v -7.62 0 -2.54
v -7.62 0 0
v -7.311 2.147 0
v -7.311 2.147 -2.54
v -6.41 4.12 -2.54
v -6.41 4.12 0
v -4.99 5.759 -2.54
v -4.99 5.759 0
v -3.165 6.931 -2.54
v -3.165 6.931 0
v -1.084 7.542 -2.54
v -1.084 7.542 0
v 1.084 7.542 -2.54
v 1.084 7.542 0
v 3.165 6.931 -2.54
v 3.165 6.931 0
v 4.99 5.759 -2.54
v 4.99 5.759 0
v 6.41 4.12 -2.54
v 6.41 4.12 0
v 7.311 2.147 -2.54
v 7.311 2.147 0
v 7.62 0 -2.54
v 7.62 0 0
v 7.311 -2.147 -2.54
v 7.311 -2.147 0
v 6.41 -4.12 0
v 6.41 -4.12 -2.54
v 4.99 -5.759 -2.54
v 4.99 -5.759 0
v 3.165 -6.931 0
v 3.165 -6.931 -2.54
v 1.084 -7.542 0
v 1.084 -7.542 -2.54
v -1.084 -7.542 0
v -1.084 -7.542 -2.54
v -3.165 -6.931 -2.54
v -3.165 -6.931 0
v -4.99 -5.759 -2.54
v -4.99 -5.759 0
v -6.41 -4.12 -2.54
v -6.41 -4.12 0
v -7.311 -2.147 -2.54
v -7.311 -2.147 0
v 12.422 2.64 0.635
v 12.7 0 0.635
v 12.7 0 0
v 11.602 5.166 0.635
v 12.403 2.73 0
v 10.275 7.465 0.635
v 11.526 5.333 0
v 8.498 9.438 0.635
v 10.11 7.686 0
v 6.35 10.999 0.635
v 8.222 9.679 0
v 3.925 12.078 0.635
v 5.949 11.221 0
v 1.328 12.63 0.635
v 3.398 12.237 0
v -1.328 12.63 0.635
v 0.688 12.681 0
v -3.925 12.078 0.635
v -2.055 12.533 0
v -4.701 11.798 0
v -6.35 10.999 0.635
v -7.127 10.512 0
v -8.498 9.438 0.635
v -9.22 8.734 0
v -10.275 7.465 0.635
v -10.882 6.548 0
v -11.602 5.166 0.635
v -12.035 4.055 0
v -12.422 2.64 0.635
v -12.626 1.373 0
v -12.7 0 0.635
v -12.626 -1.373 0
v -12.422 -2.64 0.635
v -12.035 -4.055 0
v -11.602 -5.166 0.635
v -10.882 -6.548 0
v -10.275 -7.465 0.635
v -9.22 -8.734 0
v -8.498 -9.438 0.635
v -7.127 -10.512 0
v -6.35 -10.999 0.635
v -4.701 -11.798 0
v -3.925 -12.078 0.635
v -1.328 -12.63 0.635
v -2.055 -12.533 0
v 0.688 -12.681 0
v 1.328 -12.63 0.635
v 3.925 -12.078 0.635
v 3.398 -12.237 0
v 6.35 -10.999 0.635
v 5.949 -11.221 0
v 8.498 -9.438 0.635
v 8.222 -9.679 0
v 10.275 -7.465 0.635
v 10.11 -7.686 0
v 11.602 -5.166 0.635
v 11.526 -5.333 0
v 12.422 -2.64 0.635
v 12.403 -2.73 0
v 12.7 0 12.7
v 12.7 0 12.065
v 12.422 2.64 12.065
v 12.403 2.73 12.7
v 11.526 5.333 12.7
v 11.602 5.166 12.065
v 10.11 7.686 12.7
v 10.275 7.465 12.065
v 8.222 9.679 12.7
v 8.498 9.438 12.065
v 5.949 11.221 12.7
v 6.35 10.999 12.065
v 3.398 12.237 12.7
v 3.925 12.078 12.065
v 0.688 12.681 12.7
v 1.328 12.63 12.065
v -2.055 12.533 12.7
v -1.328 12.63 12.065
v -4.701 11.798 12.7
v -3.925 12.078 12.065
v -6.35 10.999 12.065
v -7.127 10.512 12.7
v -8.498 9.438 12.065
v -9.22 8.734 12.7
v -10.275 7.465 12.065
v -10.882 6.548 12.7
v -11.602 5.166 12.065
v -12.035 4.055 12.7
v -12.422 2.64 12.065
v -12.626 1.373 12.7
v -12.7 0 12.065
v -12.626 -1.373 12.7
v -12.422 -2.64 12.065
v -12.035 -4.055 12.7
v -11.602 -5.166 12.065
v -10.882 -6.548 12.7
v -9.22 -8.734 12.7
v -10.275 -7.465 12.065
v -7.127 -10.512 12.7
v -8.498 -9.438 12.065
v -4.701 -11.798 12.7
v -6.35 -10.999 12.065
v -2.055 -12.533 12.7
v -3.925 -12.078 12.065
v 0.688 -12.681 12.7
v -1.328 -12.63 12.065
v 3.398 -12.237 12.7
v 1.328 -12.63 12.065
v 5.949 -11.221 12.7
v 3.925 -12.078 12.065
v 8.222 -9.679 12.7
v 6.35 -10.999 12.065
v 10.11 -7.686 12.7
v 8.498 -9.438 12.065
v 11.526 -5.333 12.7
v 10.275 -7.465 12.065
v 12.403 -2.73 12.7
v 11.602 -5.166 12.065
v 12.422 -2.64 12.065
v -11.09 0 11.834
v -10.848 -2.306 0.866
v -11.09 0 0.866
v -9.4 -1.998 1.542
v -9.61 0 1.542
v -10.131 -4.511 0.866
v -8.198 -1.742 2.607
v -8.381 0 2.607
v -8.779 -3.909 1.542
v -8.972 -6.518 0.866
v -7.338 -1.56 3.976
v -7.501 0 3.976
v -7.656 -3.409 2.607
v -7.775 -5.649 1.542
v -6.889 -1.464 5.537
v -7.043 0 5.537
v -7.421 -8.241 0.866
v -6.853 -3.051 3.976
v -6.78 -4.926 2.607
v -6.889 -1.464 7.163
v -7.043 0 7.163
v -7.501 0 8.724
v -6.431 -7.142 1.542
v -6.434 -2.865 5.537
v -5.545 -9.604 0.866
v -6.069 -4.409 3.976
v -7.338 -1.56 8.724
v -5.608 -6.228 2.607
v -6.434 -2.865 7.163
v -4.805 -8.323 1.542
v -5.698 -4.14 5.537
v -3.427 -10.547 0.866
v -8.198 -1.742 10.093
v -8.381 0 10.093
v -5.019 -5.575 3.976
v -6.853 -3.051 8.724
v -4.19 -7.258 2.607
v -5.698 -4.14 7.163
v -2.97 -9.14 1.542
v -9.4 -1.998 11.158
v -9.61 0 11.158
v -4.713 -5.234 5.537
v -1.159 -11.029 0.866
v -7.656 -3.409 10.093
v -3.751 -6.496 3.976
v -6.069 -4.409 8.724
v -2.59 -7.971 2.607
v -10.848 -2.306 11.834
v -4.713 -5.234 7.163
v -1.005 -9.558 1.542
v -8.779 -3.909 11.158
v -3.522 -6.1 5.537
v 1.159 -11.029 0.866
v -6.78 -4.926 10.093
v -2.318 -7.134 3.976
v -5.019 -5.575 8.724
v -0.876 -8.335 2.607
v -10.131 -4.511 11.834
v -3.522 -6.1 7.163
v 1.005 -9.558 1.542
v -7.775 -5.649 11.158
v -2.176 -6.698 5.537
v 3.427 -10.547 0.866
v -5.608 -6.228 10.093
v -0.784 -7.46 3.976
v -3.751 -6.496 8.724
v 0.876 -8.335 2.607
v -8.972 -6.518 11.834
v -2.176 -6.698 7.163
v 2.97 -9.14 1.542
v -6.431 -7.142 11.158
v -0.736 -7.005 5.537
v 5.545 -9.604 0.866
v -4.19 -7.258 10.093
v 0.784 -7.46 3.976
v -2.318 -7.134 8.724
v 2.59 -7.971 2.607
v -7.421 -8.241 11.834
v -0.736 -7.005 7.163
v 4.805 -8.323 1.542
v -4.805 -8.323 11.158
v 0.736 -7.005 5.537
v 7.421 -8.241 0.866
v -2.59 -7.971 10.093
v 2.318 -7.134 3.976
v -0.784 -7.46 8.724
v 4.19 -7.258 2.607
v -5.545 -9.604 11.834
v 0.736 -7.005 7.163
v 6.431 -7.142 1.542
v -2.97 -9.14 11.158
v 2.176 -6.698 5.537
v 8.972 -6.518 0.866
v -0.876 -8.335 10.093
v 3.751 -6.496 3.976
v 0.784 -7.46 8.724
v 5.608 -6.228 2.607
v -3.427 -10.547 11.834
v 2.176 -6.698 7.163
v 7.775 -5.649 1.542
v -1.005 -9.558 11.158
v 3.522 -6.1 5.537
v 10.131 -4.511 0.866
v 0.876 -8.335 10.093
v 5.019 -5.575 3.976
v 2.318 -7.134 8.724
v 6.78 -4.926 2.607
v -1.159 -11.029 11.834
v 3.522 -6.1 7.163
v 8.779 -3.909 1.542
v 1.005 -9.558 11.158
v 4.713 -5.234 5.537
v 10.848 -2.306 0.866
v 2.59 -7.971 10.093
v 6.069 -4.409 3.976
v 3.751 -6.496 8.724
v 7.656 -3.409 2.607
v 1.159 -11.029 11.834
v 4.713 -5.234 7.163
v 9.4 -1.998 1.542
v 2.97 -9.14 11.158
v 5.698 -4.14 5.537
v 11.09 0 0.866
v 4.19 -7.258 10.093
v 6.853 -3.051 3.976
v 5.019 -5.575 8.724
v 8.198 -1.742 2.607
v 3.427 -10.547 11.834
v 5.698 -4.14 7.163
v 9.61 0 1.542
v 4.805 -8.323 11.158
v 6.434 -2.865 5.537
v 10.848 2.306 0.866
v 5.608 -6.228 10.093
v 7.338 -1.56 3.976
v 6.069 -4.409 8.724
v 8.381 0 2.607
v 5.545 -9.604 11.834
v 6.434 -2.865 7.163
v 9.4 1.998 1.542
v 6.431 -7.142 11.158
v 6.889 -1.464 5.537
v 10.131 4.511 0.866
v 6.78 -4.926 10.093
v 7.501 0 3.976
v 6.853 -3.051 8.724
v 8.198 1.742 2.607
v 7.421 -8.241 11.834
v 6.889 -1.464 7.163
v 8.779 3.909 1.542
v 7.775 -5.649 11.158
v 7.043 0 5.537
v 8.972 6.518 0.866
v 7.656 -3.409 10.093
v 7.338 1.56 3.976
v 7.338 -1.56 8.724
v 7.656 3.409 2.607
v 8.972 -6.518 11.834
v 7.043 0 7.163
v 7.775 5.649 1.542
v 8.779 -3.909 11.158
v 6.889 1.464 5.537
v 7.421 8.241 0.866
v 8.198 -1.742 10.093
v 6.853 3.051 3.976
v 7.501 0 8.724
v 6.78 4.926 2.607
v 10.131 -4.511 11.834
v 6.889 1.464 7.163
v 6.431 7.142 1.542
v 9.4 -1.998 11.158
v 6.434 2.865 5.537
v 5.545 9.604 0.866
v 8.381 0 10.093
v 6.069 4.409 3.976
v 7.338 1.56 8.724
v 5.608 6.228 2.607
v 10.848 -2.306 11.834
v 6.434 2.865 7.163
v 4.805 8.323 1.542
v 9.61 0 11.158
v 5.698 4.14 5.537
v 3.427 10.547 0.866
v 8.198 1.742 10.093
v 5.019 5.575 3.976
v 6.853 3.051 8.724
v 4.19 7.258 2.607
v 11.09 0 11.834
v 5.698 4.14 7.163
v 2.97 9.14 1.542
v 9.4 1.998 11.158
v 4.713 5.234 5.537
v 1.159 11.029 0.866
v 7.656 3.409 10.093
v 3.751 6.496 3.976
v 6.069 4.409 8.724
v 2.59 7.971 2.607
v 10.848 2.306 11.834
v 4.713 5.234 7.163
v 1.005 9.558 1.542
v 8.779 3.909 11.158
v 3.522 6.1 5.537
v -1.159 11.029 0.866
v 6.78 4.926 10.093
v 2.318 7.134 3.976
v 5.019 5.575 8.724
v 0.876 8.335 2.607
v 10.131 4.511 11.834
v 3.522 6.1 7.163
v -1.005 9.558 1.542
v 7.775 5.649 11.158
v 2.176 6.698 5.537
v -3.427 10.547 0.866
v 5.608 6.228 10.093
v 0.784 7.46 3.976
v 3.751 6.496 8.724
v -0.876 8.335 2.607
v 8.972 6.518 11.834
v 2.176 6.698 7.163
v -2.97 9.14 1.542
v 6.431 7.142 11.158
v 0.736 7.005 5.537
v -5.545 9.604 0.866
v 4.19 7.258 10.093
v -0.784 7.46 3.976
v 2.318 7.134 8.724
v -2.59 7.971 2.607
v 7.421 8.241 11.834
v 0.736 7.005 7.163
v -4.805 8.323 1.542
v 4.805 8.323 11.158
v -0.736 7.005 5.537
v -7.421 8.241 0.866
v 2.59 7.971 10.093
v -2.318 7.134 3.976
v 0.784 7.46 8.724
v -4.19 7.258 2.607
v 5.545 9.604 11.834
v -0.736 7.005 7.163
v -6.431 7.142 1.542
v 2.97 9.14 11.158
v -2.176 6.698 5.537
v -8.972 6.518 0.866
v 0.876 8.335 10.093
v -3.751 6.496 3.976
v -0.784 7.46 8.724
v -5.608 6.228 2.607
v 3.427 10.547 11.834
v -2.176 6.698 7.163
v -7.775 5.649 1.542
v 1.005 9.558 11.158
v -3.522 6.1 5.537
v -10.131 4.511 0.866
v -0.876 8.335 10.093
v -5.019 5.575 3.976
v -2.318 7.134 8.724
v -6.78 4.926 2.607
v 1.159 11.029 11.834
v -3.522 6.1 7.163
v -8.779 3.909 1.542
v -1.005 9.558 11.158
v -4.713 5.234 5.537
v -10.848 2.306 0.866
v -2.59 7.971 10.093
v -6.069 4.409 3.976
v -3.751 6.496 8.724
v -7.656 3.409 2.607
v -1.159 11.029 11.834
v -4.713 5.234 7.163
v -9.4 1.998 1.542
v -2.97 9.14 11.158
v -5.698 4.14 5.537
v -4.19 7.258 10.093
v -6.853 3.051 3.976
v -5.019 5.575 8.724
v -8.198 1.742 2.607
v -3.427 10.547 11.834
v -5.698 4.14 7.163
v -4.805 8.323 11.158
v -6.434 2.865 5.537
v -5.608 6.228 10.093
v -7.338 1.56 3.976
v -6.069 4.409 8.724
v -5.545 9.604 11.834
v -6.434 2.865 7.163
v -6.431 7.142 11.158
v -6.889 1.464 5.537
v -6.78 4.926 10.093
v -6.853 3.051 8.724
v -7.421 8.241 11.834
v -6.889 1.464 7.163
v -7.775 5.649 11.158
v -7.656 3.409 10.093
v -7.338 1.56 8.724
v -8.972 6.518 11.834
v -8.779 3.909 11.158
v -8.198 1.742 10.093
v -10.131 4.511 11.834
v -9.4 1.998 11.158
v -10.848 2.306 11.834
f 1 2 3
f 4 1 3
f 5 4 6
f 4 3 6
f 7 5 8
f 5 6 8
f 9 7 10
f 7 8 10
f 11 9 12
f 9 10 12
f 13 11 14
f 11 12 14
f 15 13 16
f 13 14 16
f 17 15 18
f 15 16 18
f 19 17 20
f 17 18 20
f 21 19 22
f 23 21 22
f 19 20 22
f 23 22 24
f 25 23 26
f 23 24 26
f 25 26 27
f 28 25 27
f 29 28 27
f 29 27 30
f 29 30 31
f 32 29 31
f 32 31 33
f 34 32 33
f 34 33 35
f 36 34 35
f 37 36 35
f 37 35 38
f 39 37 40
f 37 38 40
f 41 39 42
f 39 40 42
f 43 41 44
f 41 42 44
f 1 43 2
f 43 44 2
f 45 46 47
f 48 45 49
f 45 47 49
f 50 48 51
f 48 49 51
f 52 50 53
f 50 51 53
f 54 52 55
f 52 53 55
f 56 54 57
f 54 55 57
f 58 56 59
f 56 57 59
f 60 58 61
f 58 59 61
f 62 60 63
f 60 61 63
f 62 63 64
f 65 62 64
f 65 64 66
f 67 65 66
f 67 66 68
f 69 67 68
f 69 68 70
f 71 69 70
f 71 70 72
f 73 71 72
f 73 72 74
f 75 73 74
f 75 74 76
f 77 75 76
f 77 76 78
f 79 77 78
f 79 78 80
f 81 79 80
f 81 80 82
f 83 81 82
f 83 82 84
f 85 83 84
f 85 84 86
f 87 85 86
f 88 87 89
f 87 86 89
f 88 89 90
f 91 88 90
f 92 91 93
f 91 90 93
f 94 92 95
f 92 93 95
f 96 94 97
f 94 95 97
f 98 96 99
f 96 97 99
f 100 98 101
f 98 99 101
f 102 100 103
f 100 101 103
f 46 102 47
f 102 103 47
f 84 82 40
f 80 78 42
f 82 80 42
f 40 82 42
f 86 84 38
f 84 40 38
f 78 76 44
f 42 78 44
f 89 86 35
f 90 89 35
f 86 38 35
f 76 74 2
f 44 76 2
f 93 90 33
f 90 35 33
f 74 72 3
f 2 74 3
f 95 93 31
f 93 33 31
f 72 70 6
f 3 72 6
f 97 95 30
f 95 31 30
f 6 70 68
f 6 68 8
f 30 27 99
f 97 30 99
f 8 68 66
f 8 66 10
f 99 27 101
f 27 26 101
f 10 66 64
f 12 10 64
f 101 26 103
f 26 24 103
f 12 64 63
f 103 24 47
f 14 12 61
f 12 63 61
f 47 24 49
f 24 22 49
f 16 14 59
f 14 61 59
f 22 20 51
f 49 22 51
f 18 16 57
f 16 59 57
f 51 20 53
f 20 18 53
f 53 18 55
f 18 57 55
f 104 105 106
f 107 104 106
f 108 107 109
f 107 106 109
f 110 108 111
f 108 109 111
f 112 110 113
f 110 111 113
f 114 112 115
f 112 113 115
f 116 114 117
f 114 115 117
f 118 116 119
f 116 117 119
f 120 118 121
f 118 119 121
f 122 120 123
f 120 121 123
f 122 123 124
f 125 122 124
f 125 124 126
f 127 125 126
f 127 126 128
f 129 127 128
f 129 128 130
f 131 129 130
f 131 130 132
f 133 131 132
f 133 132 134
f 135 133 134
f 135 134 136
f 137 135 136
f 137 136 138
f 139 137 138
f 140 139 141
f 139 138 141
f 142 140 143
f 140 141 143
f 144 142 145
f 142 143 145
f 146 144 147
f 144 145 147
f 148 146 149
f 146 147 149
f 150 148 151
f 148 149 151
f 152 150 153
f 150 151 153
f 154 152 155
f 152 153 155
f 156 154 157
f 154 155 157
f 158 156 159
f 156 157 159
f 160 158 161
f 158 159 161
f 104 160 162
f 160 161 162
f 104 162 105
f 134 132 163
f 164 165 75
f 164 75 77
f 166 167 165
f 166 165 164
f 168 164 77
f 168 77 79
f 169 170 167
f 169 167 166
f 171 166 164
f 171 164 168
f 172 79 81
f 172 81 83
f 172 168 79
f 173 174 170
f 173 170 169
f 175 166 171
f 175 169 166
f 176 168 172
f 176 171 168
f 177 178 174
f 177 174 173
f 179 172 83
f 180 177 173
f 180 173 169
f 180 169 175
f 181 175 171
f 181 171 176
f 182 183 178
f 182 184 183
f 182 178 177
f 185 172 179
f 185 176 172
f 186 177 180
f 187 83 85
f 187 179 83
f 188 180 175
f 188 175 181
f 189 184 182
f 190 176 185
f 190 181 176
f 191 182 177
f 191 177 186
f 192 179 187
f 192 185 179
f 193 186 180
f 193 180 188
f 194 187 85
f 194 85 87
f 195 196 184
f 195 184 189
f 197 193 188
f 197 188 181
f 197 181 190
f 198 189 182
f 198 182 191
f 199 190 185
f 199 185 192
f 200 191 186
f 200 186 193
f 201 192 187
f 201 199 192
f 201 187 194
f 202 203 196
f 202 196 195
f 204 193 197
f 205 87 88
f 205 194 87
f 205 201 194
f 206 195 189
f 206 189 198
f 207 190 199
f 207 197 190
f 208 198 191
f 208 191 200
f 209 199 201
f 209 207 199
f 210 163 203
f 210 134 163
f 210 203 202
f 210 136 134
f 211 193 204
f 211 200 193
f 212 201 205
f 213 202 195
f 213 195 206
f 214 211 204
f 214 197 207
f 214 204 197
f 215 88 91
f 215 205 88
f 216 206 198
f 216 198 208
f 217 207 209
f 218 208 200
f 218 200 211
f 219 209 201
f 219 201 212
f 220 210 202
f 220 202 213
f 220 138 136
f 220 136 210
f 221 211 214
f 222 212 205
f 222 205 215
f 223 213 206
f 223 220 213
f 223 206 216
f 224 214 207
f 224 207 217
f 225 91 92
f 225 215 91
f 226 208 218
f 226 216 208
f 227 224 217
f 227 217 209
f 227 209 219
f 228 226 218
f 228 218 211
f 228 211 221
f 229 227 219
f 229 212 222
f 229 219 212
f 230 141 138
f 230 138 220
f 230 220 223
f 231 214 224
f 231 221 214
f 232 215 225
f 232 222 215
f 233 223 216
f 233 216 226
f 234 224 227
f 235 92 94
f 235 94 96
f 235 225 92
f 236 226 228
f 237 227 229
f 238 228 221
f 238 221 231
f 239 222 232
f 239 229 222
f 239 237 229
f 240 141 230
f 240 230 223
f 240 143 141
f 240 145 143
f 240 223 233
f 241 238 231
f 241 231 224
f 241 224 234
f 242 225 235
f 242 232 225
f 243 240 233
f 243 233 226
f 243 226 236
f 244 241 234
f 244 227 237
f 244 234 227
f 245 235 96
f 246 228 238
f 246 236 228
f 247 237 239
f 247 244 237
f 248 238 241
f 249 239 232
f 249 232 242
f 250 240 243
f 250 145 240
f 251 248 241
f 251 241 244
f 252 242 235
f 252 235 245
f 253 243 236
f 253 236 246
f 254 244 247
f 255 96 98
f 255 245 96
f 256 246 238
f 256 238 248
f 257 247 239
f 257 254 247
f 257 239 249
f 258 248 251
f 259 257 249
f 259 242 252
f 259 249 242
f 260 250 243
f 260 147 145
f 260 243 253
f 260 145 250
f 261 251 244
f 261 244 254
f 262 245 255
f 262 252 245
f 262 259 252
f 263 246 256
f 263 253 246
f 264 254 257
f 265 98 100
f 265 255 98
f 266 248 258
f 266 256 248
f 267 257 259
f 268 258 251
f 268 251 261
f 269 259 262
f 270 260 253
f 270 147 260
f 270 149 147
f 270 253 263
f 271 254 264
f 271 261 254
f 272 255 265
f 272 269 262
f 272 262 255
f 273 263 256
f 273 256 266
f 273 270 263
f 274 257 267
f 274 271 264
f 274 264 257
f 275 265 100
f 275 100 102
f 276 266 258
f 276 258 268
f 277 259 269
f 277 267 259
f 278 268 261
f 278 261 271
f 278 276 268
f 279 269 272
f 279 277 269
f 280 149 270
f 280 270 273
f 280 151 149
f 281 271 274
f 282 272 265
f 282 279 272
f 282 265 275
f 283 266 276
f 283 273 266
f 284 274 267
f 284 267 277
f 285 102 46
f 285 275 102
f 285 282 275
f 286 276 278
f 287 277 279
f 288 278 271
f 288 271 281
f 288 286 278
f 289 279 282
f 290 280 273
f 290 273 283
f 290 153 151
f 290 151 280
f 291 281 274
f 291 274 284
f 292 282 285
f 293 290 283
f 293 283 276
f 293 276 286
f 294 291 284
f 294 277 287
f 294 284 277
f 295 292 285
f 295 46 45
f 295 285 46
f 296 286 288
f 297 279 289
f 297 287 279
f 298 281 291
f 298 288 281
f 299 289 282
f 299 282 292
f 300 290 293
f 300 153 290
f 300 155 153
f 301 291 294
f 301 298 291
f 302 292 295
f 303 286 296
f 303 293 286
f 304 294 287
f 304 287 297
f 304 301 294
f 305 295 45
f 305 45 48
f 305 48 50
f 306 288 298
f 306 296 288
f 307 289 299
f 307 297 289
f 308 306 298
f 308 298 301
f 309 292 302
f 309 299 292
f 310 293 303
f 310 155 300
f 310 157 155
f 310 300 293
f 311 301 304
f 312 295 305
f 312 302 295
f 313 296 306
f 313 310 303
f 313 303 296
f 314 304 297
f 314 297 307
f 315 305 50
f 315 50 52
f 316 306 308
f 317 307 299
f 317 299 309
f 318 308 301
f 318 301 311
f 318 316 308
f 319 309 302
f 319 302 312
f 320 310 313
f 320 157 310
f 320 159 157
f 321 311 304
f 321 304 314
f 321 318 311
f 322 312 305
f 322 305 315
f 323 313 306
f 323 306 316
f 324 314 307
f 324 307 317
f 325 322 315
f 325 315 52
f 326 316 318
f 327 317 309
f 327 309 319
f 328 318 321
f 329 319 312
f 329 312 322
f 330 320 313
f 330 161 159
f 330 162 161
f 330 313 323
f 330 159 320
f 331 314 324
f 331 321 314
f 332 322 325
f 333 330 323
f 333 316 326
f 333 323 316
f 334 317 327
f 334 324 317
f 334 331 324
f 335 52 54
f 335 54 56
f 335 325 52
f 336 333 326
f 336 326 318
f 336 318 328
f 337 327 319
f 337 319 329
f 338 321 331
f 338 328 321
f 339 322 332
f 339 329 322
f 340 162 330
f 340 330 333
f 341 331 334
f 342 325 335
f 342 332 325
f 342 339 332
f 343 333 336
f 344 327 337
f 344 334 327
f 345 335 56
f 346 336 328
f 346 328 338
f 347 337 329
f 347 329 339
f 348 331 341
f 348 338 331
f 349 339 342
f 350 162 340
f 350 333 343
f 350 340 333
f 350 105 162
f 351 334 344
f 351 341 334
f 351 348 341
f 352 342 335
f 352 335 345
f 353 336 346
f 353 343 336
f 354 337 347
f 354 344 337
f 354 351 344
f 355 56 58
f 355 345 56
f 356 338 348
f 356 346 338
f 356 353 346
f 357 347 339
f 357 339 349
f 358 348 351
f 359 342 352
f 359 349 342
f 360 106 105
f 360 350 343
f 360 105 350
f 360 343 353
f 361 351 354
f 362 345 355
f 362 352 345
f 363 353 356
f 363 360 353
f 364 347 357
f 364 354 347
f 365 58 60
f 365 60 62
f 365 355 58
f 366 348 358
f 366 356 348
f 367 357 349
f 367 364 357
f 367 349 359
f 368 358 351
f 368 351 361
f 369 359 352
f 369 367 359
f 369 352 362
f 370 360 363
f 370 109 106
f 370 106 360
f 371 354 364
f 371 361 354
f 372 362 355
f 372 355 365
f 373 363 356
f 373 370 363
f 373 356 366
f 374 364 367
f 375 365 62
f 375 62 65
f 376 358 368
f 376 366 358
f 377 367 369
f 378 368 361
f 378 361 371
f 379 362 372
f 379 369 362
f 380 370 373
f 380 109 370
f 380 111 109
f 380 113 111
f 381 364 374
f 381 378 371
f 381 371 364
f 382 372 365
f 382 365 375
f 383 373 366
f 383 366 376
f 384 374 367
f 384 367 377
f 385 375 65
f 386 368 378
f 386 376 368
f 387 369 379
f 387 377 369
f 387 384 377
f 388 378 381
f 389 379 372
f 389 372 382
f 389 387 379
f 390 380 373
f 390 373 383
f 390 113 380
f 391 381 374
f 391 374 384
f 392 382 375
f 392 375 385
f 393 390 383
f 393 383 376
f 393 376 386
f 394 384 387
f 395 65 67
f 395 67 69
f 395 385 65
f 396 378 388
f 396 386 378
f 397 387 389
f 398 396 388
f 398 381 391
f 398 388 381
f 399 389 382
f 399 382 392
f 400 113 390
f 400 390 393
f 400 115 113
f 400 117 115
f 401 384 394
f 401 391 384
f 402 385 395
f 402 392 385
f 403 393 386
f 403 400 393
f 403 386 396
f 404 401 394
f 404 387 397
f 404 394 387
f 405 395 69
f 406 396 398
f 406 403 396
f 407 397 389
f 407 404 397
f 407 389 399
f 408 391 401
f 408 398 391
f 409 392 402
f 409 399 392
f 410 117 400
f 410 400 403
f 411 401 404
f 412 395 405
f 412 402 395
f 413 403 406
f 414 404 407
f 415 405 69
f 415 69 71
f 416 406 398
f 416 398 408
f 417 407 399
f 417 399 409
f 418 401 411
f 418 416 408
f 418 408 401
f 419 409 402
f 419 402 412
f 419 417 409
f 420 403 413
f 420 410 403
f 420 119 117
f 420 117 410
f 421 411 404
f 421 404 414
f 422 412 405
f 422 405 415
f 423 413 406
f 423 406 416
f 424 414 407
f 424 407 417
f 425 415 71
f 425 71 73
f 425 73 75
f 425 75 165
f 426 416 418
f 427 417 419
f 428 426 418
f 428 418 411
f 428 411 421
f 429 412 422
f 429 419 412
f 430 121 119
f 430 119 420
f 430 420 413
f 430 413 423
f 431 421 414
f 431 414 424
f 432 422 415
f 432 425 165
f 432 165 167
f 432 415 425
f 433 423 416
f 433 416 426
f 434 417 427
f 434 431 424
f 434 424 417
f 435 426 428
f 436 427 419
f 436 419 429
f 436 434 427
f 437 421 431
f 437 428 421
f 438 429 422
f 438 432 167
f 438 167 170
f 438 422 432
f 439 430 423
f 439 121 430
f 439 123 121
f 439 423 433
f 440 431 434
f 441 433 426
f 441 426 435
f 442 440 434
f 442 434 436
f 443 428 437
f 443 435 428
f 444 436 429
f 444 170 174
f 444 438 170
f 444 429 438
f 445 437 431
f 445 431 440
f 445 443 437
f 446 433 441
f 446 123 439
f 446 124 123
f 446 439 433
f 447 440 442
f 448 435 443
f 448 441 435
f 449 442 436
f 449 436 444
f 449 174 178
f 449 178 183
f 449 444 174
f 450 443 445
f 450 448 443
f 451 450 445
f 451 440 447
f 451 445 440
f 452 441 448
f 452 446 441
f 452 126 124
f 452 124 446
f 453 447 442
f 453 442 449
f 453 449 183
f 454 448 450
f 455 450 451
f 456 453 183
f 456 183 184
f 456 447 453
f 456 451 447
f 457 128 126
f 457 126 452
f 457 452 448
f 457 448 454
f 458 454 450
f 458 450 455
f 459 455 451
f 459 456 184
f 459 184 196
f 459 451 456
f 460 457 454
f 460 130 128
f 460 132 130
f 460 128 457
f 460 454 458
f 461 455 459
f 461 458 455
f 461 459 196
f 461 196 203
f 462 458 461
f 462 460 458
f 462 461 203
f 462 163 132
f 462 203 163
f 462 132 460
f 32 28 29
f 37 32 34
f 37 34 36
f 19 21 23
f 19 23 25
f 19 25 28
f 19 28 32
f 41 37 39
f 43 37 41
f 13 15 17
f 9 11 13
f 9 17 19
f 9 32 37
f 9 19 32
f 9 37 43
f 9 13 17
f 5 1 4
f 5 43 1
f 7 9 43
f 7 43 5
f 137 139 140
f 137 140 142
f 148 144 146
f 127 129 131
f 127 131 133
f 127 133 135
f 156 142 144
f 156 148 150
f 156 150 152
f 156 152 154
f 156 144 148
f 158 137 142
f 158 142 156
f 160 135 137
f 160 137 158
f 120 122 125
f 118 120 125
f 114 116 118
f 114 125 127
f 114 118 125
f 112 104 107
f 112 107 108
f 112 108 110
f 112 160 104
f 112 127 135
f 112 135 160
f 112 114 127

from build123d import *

# Parameters (mm, degrees)
SKETCH1_R           = 12.7
BOSS_EXTRUDE1_DEPTH = 12.7
SKETCH4_R           = 7.62
BOSS_EXTRUDE2_DEPTH = 2.54


with BuildPart() as part:
    # Sketch1 → Boss-Extrude1 (new body)
    with BuildSketch(Plane.XY):
        Circle(SKETCH1_R)
    extrude(amount=BOSS_EXTRUDE1_DEPTH)

    # Sketch2 → Cut-Revolve1 (revolve, cut)
    with BuildSketch(Plane(origin=(0, 0, 0), x_dir=(0, 0, -1), z_dir=(1, 0, 0)), mode=Mode.PRIVATE) as cut_revolve1_sk:
        with BuildLine():
            Line((-12.065, 12.7), (-0.635, 12.7))
            ThreePointArc((-0.635, 12.7), (-6.35, 6.985), (-12.065, 12.7))
        make_face()
    revolve(cut_revolve1_sk.sketch.rotate(Axis((0, 0, 6.35), (0, 0, 1)), 90), axis=Axis((0, 0, 6.35), (0, 0, 1)), mode=Mode.SUBTRACT)

    # Sketch4 → Boss-Extrude2 (add)
    with BuildSketch(Plane(origin=(0, 0, 0), x_dir=(-1, 0, 0), z_dir=(0, 0, -1))):
        Circle(SKETCH4_R)
    extrude(amount=BOSS_EXTRUDE2_DEPTH)


solid = part.part
